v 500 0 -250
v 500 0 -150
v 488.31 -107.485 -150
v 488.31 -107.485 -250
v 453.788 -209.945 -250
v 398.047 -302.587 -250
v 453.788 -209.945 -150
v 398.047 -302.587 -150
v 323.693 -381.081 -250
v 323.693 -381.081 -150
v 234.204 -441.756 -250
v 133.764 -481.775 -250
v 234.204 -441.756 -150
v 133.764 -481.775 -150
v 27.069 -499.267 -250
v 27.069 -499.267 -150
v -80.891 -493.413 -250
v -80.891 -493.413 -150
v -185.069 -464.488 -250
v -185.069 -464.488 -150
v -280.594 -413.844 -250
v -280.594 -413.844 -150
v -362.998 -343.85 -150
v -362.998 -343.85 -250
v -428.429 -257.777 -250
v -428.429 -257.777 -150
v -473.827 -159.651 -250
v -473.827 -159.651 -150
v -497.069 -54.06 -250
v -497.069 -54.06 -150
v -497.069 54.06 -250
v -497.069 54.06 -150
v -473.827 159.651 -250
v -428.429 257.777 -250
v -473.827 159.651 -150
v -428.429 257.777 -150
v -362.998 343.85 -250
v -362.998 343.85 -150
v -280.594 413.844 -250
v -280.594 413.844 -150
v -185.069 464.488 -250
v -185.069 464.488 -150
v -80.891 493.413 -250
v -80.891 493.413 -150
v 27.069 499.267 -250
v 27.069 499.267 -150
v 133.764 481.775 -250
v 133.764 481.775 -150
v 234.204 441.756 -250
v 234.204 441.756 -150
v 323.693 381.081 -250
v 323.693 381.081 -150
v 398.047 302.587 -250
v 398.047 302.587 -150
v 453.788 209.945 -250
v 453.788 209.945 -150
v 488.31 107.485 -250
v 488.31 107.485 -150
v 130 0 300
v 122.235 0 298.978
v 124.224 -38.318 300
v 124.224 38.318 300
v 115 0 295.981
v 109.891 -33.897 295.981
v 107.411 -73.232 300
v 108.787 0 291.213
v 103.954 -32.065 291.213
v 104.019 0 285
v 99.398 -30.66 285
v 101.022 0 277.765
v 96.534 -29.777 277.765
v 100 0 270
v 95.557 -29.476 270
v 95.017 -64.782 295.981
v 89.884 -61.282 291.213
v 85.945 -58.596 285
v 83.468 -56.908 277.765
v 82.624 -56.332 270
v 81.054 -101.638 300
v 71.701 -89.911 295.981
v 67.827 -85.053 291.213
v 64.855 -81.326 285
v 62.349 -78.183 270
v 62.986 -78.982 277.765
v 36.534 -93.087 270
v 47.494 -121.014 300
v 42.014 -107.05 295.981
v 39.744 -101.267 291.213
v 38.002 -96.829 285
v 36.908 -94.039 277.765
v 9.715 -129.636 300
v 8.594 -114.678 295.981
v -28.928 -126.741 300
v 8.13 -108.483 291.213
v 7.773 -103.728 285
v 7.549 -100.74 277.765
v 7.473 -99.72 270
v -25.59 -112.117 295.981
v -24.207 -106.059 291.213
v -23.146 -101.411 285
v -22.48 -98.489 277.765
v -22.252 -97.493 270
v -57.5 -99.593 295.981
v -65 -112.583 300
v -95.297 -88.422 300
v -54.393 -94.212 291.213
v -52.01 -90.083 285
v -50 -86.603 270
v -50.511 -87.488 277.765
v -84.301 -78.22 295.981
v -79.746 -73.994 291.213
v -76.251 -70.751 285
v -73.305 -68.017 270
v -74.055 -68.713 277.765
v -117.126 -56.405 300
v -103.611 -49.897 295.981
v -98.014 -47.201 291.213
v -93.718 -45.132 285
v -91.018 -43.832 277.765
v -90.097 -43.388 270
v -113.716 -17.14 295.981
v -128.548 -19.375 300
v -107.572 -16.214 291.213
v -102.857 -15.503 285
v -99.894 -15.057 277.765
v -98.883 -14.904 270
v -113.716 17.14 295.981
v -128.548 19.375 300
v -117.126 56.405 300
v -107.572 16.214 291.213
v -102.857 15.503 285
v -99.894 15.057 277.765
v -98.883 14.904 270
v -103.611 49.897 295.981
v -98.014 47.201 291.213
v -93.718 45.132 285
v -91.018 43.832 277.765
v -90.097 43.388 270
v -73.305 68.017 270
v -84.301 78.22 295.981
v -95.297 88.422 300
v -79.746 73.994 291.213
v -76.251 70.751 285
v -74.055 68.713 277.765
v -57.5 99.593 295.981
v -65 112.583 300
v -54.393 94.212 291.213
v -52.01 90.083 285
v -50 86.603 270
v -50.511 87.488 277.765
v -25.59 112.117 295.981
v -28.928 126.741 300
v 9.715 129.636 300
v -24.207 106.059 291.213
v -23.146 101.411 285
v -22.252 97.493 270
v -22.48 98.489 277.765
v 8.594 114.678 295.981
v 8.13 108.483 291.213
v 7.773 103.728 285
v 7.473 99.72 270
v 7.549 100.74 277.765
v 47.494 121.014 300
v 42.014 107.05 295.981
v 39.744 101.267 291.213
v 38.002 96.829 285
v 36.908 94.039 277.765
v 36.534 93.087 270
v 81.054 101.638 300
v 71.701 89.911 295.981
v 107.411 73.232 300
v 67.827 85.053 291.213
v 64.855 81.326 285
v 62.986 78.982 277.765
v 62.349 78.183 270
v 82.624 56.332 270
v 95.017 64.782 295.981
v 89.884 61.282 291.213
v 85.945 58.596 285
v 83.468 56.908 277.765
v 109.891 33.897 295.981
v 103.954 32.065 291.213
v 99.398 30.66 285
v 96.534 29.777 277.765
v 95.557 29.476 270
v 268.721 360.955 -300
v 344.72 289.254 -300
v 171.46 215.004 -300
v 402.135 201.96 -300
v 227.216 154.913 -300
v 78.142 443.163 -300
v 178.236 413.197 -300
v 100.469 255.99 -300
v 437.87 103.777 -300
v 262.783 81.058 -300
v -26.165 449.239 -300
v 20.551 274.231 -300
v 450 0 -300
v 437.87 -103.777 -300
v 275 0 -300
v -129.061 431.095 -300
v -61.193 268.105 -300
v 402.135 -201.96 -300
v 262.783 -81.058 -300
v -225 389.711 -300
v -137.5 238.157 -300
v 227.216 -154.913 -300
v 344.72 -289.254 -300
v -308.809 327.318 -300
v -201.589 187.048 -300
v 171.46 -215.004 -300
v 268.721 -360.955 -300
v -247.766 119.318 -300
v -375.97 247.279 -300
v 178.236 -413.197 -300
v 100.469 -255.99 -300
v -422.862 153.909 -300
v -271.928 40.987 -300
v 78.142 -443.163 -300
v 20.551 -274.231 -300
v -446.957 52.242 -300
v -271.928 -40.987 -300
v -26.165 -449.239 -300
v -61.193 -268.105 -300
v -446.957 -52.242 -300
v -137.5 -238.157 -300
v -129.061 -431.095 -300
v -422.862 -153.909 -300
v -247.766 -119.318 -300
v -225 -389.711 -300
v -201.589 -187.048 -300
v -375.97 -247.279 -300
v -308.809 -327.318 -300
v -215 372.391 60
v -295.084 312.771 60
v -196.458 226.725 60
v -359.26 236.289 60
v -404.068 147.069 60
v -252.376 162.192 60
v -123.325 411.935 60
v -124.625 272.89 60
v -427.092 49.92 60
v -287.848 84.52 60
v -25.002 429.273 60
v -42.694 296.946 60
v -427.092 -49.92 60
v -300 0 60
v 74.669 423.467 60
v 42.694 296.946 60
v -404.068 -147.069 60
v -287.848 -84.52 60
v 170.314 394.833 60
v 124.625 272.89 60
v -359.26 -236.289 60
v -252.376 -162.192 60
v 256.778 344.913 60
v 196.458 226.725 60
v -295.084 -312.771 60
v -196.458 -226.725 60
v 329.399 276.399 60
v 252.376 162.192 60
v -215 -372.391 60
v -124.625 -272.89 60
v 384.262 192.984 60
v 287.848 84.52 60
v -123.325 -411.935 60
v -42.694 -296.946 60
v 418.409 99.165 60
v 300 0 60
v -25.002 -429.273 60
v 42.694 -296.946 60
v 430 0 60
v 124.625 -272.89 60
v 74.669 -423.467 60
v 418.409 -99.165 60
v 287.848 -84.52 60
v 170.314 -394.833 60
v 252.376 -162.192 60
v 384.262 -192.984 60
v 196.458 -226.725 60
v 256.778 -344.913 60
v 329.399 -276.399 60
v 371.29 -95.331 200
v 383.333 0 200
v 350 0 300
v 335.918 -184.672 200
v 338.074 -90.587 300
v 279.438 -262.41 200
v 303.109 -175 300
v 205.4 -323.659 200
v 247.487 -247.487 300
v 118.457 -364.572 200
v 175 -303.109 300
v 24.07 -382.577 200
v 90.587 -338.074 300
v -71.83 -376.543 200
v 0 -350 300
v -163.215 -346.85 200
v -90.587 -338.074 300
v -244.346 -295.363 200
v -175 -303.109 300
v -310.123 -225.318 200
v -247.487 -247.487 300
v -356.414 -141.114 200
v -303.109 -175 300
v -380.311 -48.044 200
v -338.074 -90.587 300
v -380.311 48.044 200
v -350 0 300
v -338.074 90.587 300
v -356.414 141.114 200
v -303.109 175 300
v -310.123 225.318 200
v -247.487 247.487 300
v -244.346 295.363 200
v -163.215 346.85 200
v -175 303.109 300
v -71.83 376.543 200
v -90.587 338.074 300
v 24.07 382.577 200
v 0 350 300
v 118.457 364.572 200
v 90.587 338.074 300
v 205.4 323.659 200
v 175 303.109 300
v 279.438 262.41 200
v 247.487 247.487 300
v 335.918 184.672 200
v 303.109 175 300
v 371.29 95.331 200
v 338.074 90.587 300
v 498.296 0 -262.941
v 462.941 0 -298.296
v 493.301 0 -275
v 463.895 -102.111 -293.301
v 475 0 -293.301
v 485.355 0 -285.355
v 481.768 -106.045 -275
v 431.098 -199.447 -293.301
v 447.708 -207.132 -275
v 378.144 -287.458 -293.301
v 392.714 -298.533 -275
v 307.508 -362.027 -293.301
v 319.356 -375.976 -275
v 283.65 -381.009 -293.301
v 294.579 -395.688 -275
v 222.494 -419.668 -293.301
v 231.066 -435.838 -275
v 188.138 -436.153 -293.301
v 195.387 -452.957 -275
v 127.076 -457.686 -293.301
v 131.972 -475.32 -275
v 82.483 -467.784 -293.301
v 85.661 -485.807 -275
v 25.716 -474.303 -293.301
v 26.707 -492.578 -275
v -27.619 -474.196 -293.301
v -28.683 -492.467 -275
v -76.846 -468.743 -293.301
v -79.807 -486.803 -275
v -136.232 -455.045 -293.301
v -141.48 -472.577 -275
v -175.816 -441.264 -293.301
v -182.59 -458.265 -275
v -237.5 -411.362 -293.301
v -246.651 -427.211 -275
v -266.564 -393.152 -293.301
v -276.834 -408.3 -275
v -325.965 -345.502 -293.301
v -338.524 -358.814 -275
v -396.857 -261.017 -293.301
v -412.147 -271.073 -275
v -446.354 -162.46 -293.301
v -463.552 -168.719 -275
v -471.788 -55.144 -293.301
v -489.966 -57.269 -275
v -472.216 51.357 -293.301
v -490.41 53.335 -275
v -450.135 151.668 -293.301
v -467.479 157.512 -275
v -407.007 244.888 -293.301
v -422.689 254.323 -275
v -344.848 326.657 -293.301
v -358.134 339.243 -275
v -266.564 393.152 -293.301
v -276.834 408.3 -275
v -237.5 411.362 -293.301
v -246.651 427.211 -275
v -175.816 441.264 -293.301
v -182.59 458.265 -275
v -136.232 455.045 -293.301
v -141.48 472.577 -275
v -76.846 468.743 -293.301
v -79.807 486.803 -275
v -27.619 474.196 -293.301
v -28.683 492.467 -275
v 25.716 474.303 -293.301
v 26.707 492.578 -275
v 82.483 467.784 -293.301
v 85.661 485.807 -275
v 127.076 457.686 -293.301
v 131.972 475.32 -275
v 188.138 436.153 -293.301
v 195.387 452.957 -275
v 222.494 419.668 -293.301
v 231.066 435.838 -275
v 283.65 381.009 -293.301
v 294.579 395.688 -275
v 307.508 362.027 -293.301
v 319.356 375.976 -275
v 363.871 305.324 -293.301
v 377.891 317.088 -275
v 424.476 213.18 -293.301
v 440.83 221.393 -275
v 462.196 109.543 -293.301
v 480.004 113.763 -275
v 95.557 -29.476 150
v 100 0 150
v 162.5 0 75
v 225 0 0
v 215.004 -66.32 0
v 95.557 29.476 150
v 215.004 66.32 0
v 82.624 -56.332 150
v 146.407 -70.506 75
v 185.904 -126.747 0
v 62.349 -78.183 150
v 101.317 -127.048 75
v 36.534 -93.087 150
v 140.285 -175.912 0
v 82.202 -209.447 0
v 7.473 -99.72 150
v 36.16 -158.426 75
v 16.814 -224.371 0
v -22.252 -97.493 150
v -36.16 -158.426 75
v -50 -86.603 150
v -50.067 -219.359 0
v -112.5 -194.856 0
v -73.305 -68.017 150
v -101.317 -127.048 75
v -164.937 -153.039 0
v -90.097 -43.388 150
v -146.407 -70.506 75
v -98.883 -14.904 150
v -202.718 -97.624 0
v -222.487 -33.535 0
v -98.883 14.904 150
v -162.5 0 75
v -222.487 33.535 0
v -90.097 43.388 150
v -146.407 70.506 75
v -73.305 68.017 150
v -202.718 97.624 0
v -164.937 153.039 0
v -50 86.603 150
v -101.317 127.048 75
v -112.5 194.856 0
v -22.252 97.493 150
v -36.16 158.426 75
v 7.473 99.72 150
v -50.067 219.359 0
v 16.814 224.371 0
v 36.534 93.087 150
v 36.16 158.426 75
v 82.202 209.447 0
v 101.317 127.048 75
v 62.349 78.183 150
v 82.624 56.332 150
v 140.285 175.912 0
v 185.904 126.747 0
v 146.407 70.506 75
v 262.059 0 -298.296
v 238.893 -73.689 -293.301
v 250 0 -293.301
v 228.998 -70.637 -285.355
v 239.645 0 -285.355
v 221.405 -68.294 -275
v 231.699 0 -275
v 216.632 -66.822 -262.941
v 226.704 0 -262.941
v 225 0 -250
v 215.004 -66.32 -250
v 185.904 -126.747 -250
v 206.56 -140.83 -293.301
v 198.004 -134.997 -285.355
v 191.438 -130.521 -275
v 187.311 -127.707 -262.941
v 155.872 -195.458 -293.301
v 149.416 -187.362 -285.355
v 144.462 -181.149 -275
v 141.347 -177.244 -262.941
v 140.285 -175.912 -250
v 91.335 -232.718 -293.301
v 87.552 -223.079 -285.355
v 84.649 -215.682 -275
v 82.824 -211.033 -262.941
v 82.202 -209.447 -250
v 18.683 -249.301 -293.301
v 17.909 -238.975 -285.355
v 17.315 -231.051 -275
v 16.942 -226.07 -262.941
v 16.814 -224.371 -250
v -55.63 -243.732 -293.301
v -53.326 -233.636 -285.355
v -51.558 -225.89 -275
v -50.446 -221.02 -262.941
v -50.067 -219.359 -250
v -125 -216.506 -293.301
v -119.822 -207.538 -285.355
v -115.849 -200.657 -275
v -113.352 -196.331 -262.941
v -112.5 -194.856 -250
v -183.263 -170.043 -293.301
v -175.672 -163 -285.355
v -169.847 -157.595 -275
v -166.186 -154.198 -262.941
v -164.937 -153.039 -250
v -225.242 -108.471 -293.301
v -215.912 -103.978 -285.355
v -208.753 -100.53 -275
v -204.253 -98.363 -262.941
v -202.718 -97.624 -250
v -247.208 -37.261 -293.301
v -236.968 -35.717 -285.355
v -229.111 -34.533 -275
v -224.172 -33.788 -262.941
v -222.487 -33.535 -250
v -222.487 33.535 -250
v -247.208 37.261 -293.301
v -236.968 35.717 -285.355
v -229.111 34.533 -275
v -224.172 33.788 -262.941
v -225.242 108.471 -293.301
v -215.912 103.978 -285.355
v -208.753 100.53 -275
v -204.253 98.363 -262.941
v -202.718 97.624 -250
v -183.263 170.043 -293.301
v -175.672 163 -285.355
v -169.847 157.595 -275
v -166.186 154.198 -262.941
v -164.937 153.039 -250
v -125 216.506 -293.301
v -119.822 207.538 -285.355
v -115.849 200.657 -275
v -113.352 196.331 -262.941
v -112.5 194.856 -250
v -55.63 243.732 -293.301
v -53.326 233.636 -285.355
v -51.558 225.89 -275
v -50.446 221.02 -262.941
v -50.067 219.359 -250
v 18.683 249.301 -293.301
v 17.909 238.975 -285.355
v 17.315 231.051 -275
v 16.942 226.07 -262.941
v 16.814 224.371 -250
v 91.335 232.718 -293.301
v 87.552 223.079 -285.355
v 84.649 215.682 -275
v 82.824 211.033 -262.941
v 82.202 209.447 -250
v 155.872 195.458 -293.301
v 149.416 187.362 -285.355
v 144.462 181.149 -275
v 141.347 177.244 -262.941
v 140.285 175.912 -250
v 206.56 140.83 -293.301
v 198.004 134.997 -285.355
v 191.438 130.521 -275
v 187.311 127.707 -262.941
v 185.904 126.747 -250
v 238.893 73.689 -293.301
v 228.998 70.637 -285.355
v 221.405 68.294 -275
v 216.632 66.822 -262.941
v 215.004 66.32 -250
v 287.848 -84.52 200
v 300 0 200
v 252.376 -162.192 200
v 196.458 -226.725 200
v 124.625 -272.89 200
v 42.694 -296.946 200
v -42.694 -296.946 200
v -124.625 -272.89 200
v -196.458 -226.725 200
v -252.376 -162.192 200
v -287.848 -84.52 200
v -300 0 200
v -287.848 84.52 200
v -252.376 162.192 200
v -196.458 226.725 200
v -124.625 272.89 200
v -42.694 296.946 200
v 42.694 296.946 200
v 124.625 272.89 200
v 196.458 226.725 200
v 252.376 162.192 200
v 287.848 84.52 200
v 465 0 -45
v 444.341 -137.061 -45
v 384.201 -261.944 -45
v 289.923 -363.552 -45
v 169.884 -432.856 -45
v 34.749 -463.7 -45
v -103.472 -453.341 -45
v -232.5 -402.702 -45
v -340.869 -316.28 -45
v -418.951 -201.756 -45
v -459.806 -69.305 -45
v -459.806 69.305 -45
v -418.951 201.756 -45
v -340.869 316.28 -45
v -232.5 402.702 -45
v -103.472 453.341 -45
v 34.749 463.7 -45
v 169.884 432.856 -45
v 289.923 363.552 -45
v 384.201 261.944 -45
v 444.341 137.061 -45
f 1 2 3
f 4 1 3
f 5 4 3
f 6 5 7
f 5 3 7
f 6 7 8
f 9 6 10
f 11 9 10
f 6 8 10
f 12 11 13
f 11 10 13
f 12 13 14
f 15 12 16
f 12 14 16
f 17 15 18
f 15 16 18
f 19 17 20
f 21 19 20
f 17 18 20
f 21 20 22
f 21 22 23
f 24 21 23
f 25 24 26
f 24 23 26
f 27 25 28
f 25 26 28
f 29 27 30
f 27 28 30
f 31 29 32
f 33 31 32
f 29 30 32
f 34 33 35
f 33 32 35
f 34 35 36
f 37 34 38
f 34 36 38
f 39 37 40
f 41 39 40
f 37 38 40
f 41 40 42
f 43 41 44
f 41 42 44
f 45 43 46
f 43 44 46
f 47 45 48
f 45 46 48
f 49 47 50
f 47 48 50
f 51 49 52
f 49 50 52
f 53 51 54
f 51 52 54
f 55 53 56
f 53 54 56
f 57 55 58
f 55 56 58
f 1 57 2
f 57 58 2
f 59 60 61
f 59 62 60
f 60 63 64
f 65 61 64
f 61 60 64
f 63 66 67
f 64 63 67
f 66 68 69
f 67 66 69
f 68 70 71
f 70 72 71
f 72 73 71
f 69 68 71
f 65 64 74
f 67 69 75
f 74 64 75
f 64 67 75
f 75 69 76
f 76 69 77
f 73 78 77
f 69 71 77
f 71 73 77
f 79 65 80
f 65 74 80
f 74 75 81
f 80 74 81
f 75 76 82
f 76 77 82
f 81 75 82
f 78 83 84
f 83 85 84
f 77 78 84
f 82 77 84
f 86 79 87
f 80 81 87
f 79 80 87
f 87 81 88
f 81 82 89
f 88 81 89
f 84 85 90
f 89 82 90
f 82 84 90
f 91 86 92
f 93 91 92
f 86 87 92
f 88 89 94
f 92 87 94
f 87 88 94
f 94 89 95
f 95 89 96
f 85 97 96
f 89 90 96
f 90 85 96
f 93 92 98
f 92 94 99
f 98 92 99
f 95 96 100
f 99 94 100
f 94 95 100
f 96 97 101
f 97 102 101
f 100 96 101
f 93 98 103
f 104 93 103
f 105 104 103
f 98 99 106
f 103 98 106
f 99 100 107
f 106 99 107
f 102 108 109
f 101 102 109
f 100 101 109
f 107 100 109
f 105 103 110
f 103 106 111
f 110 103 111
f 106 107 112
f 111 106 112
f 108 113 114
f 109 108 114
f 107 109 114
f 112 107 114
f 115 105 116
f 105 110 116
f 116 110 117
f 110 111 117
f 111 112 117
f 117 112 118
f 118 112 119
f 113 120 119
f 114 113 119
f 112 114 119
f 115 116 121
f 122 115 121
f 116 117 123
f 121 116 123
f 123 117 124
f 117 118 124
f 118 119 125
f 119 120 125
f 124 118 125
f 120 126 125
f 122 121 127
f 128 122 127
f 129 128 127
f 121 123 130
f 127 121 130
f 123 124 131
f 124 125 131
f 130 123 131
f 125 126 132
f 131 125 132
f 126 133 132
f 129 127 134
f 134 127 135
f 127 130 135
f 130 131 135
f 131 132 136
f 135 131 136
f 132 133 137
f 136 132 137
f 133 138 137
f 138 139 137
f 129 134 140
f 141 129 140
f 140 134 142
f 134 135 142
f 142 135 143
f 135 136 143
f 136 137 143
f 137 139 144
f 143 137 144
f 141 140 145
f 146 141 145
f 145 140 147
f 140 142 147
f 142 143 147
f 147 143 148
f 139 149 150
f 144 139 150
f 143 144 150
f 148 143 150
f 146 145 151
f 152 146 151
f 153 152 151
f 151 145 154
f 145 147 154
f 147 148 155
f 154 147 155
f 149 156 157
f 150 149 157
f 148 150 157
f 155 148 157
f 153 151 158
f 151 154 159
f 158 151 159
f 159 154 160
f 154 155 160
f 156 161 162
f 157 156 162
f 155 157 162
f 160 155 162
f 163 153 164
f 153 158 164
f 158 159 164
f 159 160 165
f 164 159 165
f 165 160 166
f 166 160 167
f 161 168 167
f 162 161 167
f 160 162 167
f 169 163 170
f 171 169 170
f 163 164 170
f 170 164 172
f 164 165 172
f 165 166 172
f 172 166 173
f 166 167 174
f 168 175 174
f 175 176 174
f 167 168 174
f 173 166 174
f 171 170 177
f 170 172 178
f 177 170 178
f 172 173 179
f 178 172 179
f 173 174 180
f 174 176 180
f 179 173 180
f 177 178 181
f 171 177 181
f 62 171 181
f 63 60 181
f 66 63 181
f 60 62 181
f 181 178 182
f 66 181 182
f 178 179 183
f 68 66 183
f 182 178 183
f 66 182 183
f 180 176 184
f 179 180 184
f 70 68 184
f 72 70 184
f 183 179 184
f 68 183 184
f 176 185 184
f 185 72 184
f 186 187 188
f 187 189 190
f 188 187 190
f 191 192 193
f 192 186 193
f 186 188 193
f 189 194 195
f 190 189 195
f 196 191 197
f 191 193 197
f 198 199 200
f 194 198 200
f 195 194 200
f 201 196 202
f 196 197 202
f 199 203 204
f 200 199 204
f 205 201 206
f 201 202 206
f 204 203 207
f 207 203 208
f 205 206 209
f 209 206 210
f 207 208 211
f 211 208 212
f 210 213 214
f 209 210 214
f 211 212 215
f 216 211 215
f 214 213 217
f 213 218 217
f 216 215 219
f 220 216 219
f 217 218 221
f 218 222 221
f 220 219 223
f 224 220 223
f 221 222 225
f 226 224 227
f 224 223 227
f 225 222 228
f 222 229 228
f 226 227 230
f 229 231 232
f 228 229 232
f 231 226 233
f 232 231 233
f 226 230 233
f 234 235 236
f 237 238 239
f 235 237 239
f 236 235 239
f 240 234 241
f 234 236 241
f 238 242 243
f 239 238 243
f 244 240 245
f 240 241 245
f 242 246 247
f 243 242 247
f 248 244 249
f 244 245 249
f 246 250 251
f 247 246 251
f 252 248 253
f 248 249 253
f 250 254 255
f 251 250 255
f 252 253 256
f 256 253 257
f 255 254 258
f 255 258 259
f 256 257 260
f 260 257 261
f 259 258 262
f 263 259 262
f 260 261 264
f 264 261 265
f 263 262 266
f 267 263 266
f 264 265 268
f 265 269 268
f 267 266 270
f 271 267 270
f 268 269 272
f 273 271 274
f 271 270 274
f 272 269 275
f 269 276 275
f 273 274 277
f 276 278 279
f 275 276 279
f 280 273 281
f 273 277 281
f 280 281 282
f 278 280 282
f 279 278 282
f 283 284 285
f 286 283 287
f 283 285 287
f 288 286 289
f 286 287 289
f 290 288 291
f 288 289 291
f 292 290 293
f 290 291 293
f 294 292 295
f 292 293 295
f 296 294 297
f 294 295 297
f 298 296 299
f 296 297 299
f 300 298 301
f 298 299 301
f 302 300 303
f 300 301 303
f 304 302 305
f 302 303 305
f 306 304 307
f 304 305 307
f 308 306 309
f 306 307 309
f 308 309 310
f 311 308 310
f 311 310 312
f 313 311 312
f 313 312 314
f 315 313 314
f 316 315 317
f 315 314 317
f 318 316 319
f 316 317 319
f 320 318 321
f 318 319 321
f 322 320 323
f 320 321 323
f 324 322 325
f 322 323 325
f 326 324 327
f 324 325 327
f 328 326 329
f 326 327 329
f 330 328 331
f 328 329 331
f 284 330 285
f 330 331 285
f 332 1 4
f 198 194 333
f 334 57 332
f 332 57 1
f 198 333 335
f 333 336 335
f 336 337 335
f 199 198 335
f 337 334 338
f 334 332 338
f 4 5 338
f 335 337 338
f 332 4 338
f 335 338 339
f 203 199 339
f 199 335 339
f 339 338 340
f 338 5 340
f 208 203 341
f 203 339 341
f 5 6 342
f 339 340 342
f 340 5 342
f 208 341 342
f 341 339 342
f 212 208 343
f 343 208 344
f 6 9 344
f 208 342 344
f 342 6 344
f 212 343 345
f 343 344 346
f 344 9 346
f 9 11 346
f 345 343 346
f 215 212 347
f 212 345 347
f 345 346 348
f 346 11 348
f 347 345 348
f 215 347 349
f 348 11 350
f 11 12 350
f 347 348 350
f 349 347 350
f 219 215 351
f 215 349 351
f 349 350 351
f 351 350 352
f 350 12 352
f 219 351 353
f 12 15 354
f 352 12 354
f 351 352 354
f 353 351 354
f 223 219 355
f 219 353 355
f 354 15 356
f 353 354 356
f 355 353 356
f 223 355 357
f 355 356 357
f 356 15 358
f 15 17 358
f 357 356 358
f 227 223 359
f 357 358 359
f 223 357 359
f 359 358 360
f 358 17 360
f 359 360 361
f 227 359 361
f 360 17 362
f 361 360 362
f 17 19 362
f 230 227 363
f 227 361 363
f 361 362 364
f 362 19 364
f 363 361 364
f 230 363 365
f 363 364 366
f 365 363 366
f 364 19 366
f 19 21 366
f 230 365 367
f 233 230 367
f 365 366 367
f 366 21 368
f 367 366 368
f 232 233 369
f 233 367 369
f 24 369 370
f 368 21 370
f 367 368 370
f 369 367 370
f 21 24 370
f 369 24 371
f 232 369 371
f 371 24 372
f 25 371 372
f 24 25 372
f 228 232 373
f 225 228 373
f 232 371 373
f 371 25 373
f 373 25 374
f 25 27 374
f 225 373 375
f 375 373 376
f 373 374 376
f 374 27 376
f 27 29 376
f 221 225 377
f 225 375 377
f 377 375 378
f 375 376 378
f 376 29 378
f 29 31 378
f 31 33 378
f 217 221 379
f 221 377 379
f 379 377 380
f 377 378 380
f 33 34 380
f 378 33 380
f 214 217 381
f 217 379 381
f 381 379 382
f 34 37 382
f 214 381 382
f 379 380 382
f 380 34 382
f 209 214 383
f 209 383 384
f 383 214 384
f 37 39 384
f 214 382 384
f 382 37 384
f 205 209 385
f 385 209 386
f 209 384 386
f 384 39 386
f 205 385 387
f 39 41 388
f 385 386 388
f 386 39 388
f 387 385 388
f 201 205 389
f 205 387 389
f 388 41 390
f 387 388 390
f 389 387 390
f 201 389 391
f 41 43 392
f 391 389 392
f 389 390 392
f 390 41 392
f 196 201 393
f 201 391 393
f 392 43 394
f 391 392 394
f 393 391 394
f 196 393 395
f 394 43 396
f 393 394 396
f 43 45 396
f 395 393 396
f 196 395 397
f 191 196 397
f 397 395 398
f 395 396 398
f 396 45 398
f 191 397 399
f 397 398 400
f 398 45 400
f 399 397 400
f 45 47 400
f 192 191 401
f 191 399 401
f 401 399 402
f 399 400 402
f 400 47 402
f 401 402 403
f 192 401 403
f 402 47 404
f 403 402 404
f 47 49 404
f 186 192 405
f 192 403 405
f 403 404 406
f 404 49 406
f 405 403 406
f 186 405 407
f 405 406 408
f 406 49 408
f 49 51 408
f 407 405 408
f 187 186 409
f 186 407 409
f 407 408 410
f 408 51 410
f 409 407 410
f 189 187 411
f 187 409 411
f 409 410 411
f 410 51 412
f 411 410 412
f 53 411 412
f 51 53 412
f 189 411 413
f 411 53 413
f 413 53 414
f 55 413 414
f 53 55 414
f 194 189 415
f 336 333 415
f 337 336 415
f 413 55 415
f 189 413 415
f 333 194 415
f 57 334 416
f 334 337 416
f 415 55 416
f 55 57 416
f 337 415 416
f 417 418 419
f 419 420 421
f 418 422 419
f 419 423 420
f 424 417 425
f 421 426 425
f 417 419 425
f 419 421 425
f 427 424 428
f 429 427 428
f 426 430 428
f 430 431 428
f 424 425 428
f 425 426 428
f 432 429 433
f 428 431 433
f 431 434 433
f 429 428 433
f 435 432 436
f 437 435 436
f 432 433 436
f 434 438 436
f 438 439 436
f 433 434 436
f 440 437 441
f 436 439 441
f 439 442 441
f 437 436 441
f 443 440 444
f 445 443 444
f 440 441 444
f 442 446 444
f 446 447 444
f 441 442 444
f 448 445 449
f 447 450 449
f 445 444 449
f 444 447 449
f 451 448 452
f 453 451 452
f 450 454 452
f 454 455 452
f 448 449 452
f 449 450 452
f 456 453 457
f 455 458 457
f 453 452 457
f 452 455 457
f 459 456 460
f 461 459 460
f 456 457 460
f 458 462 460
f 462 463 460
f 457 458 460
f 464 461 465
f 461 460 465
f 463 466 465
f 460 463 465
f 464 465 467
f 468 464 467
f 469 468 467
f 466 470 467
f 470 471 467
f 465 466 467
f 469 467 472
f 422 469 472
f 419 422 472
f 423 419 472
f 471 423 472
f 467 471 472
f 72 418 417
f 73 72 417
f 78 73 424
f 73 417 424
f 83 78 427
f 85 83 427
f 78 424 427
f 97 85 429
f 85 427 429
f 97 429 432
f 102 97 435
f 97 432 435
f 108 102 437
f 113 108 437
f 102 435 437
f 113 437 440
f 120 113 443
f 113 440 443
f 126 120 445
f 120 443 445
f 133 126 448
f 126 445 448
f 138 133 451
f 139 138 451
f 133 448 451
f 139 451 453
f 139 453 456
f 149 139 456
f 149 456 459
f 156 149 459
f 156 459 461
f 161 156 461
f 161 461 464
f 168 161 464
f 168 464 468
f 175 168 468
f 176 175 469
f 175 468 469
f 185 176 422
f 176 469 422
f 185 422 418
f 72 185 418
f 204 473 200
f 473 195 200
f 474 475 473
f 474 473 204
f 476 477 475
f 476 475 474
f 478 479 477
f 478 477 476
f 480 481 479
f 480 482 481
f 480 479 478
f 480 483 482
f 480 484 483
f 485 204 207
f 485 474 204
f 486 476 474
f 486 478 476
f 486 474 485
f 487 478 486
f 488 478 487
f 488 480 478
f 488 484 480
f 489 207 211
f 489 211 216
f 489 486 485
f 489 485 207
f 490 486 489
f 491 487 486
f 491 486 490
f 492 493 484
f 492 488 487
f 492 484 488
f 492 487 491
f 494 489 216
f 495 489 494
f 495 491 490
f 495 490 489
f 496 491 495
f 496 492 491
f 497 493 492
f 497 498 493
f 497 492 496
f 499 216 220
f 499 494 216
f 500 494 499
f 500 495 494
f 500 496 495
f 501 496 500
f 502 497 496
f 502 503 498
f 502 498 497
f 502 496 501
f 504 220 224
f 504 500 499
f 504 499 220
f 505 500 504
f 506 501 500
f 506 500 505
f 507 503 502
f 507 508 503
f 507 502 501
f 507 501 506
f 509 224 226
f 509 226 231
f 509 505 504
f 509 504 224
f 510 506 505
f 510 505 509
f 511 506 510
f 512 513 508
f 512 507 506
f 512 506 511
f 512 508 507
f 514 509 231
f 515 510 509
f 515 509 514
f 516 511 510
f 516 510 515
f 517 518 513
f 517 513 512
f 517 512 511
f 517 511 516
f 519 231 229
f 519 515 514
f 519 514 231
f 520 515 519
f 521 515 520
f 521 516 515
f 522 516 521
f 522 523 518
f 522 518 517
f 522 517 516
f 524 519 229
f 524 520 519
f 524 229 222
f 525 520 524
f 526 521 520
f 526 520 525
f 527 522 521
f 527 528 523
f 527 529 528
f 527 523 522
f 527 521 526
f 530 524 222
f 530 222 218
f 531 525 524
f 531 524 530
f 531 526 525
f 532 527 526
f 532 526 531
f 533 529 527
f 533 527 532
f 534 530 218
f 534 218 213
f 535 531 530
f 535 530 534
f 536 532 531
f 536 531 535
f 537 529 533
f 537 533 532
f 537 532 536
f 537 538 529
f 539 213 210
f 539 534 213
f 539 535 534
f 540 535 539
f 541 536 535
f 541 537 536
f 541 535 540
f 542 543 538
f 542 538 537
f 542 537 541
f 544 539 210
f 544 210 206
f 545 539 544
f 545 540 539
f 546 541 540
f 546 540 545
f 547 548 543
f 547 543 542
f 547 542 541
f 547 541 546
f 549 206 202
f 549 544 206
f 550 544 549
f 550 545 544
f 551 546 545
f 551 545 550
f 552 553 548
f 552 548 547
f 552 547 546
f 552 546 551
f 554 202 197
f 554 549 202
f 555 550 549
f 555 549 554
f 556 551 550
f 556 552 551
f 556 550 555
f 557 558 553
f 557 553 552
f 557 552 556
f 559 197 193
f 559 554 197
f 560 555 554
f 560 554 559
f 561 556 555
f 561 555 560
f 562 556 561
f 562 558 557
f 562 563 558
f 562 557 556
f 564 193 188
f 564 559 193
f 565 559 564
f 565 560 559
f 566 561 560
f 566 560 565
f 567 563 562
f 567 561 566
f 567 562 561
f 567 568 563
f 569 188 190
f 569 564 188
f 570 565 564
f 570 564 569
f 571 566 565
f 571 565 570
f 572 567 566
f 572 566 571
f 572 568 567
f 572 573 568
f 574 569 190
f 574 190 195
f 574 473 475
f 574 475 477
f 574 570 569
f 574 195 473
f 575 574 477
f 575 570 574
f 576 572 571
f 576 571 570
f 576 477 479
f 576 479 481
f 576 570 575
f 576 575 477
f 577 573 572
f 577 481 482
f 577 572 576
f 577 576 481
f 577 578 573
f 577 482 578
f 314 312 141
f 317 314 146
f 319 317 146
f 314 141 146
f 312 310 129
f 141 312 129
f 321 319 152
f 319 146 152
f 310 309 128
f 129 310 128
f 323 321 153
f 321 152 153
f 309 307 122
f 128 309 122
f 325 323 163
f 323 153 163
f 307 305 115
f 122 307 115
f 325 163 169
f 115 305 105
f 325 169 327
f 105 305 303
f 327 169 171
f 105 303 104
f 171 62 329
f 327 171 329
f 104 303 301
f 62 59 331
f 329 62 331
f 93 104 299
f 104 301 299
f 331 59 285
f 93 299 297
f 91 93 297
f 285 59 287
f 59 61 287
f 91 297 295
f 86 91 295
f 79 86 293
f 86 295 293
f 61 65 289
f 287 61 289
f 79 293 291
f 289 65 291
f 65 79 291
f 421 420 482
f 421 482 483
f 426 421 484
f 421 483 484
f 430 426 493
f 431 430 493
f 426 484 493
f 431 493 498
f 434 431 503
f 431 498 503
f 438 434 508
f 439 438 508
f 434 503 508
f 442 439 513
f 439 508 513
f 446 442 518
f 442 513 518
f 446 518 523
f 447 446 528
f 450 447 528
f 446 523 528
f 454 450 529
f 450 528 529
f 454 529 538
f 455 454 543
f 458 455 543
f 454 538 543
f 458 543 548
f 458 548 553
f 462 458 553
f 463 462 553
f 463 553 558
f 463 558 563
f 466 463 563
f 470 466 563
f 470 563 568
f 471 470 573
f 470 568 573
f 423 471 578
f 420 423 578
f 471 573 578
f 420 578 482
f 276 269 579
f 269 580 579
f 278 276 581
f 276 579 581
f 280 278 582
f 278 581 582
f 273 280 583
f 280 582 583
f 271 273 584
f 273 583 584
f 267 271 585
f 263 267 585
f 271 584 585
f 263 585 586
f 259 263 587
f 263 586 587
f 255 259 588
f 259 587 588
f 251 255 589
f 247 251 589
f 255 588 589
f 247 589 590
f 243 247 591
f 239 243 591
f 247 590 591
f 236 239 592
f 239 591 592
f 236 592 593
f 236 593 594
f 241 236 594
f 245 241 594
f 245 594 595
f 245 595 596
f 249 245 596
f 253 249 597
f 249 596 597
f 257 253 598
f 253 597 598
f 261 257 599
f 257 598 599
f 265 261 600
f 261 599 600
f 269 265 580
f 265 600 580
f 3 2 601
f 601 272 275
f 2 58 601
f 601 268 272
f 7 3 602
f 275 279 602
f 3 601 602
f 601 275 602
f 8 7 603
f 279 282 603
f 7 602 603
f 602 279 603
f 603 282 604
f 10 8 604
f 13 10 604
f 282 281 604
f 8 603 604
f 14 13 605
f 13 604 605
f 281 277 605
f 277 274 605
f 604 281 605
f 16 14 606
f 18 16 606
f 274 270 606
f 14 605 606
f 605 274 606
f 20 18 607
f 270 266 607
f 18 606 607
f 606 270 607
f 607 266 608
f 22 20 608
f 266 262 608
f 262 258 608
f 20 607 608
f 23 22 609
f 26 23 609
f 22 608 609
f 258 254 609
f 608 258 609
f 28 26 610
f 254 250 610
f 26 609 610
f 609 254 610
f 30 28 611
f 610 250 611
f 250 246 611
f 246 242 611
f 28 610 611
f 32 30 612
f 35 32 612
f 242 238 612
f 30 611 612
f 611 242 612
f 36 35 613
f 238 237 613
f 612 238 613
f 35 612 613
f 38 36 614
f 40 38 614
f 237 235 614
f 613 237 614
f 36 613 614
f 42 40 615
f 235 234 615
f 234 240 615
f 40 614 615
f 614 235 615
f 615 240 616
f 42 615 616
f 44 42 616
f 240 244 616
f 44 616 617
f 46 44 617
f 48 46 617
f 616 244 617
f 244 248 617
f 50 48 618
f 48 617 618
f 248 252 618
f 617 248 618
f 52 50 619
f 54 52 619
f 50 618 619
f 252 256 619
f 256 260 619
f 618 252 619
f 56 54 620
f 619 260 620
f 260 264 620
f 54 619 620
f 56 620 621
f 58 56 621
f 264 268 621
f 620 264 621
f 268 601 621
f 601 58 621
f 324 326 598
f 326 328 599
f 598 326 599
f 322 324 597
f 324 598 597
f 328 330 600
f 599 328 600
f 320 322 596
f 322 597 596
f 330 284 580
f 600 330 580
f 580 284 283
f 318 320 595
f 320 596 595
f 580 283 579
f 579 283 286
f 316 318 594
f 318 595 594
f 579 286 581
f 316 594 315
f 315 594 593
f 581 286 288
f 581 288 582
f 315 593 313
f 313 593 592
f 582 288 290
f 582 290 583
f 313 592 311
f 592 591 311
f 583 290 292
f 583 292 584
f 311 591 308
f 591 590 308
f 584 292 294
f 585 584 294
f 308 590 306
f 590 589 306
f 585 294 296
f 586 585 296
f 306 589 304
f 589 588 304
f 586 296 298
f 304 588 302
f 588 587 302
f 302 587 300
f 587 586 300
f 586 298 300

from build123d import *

# Parameters (mm, degrees)
F2_R = 30
F3_R = 50
F4_R = 50


with BuildPart() as f1:
    # F0 (on Front) → F1 (revolve)
    with BuildSketch(Plane.XZ):
        Polygon((350, 300), (100, 300), (100, 150), (225, 0), (225, -300), (500, -300), (500, -150), (430, 60), (300, 60), (300, 200), (383.333333, 200), align=None)
    revolve(axis=Axis((0, 0, 0), (0, 0, -1)))

    # F2
    f2_edges = [f1.edges().sort_by_distance(p)[0] for p in [
        (-100, 0, 300),
    ]]
    fillet(f2_edges, radius=F2_R)

    # F3
    f3_edges = [f1.edges().sort_by_distance(p)[0] for p in [
        (-500, 0, -300),
    ]]
    fillet(f3_edges, radius=F3_R)

    # F4
    f4_edges = [f1.edges().sort_by_distance(p)[0] for p in [
        (-225, 0, -300),
    ]]
    fillet(f4_edges, radius=F4_R)


solid = f1.part
